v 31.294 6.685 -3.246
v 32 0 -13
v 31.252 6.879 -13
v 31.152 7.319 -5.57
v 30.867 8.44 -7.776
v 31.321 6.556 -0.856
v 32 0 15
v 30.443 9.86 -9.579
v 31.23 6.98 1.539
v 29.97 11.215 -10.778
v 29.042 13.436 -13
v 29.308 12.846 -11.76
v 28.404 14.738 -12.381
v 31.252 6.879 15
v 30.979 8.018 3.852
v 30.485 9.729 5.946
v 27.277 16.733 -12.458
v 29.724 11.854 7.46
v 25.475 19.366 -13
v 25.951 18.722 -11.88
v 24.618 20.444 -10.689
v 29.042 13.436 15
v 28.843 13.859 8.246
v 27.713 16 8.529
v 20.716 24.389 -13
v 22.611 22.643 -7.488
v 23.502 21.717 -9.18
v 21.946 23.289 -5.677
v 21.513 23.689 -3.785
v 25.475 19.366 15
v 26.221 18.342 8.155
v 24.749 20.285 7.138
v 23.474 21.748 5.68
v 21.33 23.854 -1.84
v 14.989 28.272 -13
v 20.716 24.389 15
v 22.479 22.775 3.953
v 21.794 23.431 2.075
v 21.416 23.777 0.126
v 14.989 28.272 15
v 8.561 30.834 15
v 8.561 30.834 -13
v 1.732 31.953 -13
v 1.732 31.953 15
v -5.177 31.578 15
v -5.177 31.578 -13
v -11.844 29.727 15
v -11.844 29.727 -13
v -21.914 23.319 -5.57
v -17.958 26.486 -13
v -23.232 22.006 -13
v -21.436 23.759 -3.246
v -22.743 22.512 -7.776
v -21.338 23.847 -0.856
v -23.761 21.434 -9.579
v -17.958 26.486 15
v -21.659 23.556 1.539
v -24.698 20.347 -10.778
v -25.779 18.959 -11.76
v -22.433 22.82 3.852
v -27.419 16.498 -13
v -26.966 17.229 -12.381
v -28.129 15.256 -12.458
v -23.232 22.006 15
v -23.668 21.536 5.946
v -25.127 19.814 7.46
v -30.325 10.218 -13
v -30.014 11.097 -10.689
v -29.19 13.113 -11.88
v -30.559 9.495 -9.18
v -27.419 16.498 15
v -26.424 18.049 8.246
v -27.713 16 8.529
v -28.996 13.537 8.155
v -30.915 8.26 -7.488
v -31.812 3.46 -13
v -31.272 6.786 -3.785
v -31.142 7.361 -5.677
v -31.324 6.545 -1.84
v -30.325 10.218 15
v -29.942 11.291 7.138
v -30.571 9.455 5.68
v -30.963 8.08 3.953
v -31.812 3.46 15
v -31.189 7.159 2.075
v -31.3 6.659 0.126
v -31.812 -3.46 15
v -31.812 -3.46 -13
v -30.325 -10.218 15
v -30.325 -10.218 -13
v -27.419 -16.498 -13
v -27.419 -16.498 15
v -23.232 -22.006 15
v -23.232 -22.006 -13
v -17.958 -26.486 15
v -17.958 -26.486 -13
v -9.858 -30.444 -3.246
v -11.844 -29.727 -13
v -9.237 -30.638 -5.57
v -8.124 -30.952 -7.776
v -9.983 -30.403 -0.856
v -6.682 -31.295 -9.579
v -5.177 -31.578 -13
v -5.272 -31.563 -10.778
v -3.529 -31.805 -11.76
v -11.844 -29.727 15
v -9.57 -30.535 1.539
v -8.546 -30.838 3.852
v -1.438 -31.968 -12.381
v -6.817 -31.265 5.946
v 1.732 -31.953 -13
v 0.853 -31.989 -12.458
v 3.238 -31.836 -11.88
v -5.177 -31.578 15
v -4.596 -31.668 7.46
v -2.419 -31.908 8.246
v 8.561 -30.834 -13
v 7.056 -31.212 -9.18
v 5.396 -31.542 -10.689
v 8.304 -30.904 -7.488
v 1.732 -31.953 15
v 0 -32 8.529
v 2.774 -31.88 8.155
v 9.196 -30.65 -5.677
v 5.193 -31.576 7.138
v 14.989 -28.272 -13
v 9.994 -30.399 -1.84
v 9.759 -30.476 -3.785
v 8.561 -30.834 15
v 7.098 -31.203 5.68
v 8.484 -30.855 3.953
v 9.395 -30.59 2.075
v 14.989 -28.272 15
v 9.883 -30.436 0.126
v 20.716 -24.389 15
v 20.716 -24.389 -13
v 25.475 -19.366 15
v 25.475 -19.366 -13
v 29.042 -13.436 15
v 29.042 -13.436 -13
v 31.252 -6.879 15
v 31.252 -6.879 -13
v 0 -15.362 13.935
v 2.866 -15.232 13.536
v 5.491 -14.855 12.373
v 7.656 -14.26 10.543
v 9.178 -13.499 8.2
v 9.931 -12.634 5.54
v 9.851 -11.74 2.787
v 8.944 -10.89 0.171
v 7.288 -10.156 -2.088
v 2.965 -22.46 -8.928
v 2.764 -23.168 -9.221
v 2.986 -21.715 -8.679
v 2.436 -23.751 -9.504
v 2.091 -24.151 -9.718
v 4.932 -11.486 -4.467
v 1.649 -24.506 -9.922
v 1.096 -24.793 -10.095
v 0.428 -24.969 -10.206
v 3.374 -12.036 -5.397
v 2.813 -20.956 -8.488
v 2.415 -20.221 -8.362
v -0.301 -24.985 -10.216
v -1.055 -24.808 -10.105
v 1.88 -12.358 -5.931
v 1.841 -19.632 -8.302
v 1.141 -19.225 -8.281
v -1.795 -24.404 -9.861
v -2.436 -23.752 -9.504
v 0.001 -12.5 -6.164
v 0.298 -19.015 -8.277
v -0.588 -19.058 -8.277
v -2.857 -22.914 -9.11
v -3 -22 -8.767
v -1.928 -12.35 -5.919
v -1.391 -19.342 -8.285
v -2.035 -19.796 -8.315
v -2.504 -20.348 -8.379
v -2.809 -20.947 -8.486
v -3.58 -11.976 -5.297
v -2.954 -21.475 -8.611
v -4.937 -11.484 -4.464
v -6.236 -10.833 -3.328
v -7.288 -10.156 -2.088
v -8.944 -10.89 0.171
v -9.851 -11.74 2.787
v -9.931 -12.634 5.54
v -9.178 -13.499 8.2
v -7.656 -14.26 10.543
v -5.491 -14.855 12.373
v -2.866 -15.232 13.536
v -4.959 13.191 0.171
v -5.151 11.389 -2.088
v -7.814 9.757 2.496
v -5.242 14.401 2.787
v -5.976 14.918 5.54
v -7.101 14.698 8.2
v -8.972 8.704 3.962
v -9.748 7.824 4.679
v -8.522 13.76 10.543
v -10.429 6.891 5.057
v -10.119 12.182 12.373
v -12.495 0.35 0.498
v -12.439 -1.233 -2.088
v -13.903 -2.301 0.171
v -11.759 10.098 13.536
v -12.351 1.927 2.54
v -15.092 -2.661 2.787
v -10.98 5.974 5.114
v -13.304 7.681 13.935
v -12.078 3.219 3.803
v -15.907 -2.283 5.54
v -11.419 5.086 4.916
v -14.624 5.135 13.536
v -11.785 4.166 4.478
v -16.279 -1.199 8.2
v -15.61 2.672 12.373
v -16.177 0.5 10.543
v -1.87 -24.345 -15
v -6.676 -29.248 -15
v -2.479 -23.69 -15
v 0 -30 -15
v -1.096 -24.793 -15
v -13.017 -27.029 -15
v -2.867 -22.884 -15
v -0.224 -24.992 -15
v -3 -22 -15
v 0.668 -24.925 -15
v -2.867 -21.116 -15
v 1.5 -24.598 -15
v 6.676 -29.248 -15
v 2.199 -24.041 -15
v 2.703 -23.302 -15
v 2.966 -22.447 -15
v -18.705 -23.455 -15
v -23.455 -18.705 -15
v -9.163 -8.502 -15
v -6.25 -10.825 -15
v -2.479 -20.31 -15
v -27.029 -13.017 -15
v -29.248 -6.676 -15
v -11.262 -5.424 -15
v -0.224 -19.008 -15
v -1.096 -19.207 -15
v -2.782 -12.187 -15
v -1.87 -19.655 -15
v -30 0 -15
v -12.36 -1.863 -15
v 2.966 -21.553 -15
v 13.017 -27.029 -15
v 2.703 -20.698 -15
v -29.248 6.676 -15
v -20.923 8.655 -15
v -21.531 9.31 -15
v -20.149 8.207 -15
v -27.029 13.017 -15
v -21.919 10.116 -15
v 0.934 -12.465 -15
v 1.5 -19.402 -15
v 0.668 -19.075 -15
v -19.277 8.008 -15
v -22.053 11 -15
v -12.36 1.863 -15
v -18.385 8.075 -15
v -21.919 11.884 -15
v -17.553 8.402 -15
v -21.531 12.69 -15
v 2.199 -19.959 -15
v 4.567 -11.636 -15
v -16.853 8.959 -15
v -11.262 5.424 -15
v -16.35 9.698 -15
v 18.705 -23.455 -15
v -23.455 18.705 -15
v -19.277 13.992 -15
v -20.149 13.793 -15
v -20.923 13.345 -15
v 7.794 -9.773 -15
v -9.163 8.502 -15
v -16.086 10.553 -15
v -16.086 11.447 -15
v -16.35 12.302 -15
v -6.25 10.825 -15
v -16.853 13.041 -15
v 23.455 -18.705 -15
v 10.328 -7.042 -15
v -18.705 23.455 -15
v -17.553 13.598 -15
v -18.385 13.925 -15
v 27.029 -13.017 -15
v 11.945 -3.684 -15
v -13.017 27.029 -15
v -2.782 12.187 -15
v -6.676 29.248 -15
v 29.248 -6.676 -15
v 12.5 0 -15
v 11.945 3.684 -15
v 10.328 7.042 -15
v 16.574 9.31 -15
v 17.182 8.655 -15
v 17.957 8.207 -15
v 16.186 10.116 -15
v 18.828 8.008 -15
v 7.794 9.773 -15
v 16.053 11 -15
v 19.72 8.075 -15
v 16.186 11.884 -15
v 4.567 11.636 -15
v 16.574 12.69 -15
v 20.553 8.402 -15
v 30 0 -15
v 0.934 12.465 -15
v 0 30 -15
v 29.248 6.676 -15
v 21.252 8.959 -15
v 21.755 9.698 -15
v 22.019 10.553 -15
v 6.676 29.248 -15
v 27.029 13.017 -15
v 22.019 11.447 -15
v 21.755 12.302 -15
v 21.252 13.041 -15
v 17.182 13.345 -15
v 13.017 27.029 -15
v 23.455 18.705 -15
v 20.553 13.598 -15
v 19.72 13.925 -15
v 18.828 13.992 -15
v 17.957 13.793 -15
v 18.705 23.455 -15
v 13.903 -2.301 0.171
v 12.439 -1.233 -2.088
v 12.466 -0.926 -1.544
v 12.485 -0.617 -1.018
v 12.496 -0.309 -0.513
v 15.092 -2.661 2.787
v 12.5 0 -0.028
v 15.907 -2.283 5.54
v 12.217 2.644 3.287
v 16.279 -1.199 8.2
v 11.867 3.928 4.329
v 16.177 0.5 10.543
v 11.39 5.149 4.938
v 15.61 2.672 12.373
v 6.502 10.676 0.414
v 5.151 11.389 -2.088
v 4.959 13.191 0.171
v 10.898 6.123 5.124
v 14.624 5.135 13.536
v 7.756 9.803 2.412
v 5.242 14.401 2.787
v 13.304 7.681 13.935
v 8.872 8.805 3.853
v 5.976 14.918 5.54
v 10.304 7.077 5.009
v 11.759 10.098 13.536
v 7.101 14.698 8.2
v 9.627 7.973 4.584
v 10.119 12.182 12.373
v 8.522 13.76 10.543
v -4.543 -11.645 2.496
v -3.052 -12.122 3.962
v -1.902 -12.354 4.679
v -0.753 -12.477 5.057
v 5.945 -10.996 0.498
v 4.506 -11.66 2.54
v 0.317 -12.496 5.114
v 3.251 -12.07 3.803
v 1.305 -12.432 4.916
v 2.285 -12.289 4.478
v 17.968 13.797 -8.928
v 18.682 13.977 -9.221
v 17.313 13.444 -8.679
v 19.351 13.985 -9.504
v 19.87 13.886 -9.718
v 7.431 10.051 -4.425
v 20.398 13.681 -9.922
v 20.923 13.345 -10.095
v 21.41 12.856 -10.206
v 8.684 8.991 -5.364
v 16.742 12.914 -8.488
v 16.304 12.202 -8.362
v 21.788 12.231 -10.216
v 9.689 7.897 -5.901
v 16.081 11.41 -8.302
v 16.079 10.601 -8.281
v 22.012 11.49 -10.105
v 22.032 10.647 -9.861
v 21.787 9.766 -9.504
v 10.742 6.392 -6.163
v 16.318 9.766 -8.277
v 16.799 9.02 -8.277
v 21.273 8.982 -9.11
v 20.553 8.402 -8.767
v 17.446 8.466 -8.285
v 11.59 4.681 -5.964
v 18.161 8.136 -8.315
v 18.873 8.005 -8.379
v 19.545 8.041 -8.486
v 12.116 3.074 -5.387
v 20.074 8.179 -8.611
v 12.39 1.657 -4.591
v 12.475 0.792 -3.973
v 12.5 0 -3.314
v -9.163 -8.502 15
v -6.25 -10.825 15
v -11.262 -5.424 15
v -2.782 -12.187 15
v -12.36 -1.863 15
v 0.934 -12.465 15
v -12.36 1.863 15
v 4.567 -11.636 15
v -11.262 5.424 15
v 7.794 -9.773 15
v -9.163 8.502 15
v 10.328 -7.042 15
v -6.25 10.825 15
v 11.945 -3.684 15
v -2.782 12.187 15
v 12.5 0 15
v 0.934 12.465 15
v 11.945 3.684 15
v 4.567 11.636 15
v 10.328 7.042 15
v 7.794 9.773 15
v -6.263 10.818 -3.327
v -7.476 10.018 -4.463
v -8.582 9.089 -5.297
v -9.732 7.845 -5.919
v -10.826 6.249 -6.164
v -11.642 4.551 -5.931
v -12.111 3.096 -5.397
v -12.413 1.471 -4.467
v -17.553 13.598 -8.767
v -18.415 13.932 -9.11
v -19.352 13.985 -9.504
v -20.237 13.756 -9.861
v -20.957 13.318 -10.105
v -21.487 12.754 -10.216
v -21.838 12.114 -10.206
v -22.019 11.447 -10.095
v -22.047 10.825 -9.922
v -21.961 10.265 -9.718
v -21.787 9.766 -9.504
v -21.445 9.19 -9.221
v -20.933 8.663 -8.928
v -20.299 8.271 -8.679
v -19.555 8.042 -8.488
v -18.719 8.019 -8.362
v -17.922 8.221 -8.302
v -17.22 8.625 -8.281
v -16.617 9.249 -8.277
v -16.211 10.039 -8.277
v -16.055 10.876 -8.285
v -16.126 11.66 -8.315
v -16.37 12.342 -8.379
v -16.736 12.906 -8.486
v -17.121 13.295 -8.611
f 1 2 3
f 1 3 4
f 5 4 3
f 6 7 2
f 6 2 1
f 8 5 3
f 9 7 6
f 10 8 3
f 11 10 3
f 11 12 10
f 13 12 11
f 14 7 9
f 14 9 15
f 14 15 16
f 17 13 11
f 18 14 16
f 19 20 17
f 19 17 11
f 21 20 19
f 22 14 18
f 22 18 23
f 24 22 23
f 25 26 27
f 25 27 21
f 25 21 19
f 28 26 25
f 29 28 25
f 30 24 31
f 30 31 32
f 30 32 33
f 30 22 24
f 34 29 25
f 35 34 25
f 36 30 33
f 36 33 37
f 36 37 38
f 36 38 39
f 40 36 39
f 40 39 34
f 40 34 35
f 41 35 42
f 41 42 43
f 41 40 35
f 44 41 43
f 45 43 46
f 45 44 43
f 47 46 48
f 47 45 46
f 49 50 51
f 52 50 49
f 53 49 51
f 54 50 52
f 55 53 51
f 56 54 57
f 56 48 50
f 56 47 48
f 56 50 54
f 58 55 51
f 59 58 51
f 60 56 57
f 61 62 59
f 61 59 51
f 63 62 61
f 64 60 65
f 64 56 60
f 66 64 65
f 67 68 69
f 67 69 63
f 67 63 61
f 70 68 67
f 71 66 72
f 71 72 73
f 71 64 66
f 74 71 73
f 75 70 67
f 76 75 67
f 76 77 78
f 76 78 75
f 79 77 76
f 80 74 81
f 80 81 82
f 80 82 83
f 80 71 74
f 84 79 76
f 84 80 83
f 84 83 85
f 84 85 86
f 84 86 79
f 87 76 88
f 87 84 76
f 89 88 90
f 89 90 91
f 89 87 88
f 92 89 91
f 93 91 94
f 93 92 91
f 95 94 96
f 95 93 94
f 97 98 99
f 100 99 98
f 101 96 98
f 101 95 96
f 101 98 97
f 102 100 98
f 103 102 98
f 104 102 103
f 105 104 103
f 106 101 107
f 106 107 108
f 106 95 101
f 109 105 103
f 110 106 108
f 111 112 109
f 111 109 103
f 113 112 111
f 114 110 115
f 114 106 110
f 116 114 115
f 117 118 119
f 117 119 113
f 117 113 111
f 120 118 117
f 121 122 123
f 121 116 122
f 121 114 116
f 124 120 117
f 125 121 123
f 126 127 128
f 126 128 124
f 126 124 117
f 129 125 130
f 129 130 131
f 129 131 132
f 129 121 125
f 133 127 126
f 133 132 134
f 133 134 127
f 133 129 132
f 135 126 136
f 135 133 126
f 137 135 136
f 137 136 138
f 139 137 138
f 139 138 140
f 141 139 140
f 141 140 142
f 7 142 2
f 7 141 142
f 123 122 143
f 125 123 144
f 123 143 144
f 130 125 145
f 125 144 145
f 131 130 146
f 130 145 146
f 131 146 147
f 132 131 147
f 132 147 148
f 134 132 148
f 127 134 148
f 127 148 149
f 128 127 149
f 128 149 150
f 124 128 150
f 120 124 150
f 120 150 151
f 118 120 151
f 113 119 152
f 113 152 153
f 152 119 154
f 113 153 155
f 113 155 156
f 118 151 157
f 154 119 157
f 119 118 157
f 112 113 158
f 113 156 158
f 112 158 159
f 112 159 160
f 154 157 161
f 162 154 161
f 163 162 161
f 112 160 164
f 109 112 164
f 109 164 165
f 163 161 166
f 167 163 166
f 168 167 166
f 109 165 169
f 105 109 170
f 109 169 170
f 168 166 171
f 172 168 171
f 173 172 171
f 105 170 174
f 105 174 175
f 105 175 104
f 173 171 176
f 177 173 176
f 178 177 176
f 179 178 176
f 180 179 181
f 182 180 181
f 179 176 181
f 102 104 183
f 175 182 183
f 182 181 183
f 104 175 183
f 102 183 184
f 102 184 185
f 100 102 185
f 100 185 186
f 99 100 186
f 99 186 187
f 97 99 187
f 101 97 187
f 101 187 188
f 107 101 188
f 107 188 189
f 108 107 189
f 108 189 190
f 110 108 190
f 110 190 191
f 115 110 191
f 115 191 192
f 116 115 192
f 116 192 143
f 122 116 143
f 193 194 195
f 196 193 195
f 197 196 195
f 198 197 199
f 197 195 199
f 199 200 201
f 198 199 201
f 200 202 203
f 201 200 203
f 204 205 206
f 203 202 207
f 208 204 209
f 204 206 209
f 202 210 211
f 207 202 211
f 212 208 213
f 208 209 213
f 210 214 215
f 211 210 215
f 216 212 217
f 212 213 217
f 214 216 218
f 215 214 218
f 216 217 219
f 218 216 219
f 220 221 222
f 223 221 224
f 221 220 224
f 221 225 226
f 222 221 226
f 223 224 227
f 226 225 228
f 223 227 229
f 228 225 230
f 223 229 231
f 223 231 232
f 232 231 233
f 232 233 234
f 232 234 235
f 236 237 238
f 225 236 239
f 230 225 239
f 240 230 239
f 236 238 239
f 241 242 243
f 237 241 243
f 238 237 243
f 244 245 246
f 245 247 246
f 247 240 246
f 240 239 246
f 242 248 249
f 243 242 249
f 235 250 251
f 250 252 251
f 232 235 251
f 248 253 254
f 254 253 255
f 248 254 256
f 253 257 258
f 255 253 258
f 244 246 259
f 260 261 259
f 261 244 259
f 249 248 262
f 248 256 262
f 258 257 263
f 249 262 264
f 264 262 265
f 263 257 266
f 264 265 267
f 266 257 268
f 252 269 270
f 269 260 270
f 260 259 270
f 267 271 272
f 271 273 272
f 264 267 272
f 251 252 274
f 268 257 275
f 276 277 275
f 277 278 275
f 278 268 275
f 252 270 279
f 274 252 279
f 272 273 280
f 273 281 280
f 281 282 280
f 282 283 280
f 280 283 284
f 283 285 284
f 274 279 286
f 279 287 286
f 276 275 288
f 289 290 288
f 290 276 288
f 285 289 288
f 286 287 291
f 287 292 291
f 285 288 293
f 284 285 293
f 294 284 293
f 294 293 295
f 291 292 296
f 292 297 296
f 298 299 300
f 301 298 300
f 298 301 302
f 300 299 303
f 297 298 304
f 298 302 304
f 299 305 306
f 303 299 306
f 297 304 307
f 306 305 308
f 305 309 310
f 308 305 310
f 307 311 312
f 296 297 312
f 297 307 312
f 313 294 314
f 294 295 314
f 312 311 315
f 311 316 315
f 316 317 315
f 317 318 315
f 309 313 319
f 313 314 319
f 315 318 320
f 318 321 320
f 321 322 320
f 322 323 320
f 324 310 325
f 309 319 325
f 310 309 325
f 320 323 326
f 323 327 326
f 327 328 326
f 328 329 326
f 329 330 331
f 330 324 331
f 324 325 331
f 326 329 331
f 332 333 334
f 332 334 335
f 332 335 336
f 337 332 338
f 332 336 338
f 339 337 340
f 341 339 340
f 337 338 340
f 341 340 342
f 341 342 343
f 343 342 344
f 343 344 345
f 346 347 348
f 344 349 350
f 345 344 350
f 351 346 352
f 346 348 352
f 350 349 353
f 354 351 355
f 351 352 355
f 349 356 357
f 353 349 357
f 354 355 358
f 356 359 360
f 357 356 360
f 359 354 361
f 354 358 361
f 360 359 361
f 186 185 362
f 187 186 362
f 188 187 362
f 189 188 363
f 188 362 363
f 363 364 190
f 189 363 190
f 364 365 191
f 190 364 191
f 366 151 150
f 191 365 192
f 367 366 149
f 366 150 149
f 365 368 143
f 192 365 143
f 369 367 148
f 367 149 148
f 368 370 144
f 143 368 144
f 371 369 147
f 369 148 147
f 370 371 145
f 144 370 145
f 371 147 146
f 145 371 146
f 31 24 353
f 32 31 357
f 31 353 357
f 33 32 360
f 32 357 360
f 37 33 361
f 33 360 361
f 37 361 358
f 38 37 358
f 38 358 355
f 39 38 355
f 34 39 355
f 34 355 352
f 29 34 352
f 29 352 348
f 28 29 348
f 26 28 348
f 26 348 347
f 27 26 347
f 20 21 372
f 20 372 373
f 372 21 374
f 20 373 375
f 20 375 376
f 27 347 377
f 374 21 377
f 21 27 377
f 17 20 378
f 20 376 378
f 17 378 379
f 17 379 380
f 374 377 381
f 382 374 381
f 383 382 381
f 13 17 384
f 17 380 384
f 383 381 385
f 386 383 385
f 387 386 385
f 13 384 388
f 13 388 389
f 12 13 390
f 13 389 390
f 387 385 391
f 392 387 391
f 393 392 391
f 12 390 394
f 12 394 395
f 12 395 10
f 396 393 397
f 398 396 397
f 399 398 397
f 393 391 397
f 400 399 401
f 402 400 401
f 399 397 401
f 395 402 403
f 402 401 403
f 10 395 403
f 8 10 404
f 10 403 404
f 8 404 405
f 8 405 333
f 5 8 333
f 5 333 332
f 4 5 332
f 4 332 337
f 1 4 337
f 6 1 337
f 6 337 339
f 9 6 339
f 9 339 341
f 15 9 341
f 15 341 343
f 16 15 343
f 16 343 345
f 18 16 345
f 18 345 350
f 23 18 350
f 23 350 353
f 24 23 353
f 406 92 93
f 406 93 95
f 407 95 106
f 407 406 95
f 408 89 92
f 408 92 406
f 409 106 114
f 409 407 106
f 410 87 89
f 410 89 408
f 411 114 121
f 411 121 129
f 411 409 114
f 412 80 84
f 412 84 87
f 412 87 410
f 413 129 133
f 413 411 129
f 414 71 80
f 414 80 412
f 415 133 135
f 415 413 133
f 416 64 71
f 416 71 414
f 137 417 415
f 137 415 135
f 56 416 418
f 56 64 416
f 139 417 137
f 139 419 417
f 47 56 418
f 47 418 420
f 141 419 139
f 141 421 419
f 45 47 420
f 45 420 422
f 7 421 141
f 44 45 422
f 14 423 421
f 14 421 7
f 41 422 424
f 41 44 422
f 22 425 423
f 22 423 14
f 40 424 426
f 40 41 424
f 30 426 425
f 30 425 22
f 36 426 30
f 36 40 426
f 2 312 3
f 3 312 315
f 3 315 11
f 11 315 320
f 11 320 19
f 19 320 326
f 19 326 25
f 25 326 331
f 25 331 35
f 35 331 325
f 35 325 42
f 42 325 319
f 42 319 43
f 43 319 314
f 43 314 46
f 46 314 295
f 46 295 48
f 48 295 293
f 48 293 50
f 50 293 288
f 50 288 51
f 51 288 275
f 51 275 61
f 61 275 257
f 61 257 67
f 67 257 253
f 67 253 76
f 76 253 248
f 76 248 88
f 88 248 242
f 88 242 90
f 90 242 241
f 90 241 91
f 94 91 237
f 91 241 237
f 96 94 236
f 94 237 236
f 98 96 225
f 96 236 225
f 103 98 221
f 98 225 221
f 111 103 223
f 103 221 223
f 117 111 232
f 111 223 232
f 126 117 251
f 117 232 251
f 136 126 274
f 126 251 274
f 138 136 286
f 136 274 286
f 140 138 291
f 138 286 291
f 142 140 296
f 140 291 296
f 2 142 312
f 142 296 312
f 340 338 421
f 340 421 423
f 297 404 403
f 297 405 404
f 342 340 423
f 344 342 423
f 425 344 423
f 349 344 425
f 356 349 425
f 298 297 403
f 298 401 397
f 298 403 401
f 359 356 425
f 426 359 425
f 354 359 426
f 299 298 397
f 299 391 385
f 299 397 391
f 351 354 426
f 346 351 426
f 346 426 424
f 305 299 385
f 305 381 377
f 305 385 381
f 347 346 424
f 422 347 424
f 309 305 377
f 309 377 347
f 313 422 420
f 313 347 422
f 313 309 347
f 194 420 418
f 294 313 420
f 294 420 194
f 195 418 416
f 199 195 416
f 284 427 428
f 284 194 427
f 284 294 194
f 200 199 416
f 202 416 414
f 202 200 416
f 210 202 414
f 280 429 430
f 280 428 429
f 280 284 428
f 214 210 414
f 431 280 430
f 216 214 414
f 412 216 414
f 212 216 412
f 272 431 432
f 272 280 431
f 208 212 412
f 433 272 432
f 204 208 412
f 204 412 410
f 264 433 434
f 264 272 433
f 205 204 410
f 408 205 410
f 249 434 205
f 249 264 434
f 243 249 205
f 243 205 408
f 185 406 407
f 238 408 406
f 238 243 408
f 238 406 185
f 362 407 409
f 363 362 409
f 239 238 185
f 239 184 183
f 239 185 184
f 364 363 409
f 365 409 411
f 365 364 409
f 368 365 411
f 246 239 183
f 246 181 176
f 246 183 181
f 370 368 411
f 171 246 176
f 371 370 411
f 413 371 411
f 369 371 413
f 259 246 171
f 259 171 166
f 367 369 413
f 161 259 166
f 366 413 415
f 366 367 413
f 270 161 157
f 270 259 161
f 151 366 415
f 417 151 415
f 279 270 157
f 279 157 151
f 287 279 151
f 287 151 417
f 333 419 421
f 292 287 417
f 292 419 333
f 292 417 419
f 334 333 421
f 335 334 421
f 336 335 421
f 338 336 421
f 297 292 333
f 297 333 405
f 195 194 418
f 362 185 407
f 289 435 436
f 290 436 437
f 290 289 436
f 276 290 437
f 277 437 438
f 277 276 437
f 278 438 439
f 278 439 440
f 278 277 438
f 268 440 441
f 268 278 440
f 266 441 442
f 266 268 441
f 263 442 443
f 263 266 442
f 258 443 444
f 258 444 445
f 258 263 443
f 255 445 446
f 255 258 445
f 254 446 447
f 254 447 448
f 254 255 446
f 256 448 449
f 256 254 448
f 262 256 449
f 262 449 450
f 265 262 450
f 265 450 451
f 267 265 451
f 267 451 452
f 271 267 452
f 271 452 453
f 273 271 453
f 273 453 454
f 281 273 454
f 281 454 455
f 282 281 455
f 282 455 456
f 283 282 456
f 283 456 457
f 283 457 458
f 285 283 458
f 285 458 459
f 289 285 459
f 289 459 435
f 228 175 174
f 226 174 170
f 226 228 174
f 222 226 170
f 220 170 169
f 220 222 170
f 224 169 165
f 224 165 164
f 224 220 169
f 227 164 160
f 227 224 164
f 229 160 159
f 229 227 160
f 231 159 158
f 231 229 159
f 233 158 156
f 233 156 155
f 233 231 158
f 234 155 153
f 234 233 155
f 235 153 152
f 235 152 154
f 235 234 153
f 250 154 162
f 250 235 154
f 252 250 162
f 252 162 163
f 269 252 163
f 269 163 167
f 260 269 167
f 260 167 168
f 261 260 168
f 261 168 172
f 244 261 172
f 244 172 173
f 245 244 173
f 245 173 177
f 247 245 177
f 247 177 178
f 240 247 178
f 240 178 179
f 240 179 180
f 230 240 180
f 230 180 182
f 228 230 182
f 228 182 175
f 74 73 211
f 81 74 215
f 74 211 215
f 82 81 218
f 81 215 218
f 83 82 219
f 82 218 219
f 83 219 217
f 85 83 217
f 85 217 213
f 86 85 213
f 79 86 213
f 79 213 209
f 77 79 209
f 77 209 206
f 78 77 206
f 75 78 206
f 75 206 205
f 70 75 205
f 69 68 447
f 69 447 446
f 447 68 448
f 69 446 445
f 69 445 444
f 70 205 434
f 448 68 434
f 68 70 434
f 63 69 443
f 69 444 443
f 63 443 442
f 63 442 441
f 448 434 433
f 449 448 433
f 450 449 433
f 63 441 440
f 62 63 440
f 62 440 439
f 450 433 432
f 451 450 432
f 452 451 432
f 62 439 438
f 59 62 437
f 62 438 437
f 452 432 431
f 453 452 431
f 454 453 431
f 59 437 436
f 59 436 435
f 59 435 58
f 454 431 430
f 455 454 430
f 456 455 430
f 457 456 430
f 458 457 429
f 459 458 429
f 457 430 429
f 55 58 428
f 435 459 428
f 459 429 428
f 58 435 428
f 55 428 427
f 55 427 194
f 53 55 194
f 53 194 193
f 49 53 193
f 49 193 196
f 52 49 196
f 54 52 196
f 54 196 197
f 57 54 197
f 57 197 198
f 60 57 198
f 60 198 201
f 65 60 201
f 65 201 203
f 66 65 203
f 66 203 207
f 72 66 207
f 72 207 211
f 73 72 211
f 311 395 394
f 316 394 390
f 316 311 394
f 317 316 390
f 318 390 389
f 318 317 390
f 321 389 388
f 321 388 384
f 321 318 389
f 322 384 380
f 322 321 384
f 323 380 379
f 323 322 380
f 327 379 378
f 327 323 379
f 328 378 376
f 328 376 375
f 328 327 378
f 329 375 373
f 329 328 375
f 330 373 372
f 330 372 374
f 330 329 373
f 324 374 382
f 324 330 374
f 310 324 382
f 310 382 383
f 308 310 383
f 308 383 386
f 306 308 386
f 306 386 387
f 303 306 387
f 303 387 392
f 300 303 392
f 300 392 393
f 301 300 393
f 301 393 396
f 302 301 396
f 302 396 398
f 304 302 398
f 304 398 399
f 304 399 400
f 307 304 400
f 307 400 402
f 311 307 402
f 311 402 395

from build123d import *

# Parameters (mm, degrees)
SKETCH1_R           = 32
SKETCH1_R_2         = 12.5
BOSS_EXTRUDE1_DEPTH = 15
SKETCH2_R           = 10
CUT_EXTRUDE1_DEPTH  = 56.689497751
CIRPATTERN1_COUNT   = 3
SKETCH4_R           = 3
CUT_EXTRUDE3_DEPTH  = 11
CIRPATTERN2_COUNT   = 3
CHAMFER2_SIZE       = 2


with BuildPart() as part:
    # Sketch1 → Boss-Extrude1 (new, symmetric)
    with BuildSketch(Plane.XY):
        Circle(SKETCH1_R)
        Circle(SKETCH1_R_2, mode=Mode.SUBTRACT)
    extrude(amount=BOSS_EXTRUDE1_DEPTH, both=True)

    # Sketch2 → Cut-Extrude1 (cut, through all)
    with BuildSketch(Plane(origin=(0, -9.819536819, -3.123093004), x_dir=(1, 0, 0), z_dir=(0, 0.9510565162951555, 0.3090169943749417))):
        with Locations(Location((0, -7.935834199, 0), (0, 0, 270))):
            Circle(SKETCH2_R)
    cut_extrude1 = extrude(amount=-CUT_EXTRUDE1_DEPTH, mode=Mode.SUBTRACT)

    # CirPattern1: Cut-Extrude1 ×3 about axis
    cirpattern1_axis = Axis((0, 0, 0), (0, 0, 1))
    for i in range(1, CIRPATTERN1_COUNT):
        add(cut_extrude1.rotate(cirpattern1_axis, i * 360 / CIRPATTERN1_COUNT), mode=Mode.SUBTRACT)

    # Sketch4 → Cut-Extrude3 (cut)
    with BuildSketch(Plane.XY.offset(-15)):
        with Locations(Location((0, -22, 0), (0, 0, 180))):
            Circle(SKETCH4_R)
    cut_extrude3 = extrude(amount=CUT_EXTRUDE3_DEPTH, mode=Mode.SUBTRACT)

    # CirPattern2: Cut-Extrude3 ×3 about axis
    cirpattern2_axis = Axis((0, 0, 0), (0, 0, 1))
    for i in range(1, CIRPATTERN2_COUNT):
        add(cut_extrude3.rotate(cirpattern2_axis, i * 360 / CIRPATTERN2_COUNT), mode=Mode.SUBTRACT)

    # Chamfer2
    chamfer2_edges = [part.edges().sort_by_distance(p)[0] for p in [
        (-32, 0, -15),
    ]]
    chamfer(chamfer2_edges, length=CHAMFER2_SIZE)


solid = part.part
